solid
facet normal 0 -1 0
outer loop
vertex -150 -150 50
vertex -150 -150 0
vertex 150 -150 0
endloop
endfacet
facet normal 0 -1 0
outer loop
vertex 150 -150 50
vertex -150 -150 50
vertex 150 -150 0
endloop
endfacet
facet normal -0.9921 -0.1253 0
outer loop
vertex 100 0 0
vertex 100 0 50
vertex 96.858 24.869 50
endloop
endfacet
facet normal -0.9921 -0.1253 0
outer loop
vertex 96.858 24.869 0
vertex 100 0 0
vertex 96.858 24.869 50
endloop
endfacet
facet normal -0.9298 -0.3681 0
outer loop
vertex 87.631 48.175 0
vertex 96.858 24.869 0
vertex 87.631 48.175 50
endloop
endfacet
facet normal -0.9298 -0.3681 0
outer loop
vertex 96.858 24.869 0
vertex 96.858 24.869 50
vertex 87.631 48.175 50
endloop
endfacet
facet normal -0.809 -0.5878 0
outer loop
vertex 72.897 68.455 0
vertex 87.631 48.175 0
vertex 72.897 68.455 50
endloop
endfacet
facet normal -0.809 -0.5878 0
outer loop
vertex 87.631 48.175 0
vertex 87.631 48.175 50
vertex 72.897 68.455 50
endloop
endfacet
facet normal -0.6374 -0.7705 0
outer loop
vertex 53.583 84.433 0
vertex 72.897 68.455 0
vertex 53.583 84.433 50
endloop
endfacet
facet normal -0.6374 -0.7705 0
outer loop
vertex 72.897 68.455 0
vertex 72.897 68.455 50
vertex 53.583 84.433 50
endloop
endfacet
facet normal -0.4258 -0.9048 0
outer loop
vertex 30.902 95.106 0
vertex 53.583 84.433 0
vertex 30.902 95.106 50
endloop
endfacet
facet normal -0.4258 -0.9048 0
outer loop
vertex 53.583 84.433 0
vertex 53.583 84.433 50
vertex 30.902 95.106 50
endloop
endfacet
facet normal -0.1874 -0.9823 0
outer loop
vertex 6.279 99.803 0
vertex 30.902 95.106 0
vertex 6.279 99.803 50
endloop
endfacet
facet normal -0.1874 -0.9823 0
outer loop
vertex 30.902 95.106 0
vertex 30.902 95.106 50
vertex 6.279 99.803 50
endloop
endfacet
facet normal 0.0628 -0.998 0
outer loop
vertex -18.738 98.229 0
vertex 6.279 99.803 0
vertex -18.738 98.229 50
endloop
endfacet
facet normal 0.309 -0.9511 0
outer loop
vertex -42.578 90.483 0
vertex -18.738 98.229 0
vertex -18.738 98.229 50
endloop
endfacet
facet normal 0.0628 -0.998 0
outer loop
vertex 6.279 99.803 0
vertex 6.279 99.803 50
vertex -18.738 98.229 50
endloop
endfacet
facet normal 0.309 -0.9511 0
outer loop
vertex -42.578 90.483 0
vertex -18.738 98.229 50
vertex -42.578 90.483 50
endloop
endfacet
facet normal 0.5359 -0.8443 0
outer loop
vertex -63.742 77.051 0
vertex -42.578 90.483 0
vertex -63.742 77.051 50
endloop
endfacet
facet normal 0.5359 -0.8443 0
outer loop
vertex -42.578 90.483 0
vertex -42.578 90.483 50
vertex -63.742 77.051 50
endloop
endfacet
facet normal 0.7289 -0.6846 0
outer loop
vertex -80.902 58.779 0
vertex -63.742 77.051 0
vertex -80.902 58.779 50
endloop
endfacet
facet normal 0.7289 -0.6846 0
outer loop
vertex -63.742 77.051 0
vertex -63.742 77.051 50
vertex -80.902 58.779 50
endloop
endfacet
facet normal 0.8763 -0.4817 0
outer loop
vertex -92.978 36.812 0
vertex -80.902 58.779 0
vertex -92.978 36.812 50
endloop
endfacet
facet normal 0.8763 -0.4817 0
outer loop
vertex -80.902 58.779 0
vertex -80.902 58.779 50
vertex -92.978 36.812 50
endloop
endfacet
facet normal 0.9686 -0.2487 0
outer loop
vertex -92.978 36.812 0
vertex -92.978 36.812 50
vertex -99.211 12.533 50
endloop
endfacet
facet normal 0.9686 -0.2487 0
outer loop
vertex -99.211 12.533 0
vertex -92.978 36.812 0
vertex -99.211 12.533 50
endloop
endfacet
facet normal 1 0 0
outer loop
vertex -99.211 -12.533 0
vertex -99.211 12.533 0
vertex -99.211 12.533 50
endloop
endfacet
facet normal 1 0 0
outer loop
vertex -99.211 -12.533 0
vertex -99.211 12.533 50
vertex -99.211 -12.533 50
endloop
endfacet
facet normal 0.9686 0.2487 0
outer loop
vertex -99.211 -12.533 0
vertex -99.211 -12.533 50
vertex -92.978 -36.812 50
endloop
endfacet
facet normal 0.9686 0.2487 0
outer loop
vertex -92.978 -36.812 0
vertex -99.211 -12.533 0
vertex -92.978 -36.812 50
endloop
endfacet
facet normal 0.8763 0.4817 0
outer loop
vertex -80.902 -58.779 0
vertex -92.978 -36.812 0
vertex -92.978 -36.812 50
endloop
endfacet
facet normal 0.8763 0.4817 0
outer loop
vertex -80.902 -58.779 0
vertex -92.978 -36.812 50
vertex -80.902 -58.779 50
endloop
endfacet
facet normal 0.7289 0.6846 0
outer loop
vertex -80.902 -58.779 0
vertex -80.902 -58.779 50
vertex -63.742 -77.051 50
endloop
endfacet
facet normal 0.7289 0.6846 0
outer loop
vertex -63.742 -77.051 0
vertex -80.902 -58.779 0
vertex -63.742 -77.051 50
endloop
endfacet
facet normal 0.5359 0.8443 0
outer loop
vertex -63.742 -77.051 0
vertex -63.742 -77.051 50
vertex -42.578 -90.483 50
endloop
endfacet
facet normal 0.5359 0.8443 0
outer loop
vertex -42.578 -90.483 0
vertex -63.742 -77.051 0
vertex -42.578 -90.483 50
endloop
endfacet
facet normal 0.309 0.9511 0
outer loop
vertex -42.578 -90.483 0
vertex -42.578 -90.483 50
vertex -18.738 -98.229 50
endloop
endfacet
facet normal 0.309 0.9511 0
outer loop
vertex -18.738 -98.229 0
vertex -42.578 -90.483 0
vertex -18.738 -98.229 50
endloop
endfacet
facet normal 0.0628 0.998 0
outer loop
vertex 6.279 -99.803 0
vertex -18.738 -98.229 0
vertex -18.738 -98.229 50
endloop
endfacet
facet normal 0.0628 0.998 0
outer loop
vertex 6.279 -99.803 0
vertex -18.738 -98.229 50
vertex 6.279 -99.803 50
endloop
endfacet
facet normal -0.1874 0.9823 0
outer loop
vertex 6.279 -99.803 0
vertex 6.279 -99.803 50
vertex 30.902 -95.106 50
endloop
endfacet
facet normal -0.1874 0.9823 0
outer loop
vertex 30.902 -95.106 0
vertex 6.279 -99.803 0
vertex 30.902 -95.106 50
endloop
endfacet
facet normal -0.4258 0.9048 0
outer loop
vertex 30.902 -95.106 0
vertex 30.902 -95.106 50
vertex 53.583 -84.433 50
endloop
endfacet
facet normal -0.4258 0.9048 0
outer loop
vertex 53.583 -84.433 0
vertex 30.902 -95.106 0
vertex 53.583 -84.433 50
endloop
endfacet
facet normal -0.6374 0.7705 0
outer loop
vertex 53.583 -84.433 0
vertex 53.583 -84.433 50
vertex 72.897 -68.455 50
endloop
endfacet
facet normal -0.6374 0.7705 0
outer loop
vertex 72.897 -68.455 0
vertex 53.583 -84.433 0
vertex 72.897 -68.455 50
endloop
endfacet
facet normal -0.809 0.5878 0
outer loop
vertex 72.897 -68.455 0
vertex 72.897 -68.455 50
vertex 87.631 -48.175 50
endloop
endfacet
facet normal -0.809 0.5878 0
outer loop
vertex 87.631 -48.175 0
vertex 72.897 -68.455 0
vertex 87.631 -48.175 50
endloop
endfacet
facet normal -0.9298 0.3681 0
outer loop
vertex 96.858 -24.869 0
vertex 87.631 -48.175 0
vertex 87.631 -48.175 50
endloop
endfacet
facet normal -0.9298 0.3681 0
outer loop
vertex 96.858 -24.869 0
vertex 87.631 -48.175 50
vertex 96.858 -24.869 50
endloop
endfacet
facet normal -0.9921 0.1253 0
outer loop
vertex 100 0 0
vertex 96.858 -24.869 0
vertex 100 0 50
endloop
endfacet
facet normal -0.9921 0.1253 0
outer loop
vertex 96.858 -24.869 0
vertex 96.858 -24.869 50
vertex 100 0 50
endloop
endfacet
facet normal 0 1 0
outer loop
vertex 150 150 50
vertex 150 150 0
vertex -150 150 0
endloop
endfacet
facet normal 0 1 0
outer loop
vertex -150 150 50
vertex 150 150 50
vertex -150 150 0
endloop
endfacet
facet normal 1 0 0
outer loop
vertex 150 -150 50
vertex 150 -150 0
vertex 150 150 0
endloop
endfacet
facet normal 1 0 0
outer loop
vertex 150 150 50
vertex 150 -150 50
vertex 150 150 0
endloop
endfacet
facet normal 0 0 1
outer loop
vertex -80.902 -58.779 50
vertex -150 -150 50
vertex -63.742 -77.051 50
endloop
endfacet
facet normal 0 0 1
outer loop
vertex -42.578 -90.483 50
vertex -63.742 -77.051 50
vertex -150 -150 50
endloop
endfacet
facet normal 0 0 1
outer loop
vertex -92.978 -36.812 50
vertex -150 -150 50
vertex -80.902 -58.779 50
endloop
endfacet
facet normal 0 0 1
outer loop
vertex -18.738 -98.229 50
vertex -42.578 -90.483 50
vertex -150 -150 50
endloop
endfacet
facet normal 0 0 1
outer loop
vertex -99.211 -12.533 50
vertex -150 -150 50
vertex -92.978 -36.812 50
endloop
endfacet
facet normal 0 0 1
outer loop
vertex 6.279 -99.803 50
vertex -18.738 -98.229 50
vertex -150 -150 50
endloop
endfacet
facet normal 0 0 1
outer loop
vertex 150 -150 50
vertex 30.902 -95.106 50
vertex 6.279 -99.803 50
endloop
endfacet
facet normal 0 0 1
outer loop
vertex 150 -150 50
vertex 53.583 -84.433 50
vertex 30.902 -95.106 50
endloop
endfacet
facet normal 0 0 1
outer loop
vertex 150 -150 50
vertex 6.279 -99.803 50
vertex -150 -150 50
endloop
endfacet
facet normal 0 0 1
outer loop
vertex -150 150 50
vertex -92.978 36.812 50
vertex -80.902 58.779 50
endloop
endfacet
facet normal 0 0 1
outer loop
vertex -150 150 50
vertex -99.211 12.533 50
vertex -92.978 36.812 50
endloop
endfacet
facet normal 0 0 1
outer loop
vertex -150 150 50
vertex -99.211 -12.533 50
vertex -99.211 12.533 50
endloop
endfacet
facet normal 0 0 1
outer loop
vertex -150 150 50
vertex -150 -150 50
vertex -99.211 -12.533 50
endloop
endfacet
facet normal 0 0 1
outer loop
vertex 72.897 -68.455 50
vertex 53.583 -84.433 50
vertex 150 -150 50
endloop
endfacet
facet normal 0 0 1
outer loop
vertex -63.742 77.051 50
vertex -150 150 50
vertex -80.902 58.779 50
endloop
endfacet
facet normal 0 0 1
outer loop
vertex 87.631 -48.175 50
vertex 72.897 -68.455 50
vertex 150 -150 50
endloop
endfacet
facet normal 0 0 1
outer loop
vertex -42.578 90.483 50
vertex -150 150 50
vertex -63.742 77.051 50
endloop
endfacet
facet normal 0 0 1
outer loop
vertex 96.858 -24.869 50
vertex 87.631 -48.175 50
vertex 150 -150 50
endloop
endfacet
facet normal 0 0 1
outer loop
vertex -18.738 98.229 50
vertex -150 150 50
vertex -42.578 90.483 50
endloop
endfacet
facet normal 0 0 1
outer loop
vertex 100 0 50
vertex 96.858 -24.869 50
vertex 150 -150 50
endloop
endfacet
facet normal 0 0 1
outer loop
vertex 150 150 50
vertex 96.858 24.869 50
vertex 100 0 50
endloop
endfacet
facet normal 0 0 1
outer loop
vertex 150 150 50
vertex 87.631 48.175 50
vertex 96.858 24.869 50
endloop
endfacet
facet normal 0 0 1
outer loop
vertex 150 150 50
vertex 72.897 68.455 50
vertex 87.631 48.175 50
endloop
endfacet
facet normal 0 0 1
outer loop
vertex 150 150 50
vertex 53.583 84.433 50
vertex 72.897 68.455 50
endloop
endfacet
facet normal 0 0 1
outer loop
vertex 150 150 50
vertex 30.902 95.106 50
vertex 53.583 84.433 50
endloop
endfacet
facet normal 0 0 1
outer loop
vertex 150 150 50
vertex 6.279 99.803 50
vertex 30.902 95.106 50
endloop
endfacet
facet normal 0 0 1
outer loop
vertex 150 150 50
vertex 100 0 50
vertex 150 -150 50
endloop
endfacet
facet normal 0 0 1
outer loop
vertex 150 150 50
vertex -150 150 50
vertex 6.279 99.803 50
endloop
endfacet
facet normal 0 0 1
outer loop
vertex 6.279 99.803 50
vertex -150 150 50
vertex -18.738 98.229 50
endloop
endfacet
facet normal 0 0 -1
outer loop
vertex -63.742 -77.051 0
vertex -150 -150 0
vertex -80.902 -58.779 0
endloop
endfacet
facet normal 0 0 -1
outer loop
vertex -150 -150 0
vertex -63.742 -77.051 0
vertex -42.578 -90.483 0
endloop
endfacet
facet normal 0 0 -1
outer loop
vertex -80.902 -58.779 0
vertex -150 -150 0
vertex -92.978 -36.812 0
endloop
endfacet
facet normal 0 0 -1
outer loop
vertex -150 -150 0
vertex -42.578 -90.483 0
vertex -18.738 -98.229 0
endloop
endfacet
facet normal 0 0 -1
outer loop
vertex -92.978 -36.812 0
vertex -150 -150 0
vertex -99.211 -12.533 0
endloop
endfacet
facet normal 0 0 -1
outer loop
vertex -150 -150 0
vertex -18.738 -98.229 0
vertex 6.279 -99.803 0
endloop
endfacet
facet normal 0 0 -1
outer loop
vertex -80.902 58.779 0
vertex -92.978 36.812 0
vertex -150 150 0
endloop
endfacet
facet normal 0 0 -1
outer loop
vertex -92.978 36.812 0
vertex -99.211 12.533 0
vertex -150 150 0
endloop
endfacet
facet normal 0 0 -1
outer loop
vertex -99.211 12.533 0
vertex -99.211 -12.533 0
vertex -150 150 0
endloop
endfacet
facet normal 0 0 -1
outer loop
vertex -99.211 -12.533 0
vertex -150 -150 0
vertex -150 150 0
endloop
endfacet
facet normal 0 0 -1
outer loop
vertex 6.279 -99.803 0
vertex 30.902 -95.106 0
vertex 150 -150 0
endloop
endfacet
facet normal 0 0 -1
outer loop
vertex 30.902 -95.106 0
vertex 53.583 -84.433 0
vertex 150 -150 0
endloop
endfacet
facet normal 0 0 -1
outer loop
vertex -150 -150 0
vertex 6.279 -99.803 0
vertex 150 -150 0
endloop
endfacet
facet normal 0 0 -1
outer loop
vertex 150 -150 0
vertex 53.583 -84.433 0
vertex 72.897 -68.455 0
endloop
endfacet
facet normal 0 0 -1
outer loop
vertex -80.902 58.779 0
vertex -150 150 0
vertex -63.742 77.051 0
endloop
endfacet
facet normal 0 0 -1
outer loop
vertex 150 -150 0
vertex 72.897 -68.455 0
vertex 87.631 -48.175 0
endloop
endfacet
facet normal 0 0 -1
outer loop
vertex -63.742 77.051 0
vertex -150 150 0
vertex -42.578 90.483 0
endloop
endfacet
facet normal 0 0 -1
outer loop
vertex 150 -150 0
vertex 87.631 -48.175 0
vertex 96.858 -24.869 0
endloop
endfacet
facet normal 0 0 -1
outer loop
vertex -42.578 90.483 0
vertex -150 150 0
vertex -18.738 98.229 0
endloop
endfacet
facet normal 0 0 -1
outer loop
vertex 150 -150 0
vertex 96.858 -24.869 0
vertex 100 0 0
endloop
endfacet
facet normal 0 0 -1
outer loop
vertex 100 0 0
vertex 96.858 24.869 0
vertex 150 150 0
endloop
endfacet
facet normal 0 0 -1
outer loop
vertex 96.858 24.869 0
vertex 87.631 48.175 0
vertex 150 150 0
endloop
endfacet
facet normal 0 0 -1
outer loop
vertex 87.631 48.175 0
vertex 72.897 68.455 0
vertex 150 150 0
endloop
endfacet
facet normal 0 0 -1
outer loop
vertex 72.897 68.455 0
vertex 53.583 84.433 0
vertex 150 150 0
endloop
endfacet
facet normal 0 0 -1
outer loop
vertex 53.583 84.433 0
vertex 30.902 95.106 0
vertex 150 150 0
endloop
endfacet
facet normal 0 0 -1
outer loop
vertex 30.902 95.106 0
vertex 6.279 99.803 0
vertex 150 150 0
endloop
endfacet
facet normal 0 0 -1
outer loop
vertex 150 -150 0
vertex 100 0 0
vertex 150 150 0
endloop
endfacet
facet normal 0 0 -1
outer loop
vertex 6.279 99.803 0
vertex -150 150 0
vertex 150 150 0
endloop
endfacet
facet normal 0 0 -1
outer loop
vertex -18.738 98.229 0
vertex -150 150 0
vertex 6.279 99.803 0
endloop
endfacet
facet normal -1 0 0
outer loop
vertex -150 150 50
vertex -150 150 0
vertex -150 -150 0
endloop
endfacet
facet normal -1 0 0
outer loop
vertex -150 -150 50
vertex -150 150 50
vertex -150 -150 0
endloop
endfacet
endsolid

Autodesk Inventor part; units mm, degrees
ref_plane "YZ Plane" through (0, 0, 0) normal (1, 0, 0) x (0, 1, 0)
ref_plane "XY Plane" through (0, 0, 0) normal (0, 0, 1) x (1, 0, 0)
sketch "Sketch1" plane through (0, 0, 0) normal (0, 0, 1) x (1, 0, 0)
  line L0 (-150, -150) -> (150, -150)
  line L1 (150, -150) -> (150, 150)
  line L2 (150, 150) -> (-150, 150)
  line L3 (-150, 150) -> (-150, -150)
  line L4 (-150, -150) -> (150, 150) construction
  line L5 (150, -150) -> (-150, 150) construction
  point P0 (0, 0)
  dimension "d0" = 300
  dimension "d1" = 300
extrude "Extrusion1" add sketch "Sketch1" along normal blind 50
sketch "Sketch2" plane through (0, 0, 50) normal (0, 0, 1) x (1, 0, 0)
  circle A0 centre (0, 0) radius 100
  dimension "D_agujero" = 200
extrude "Extrusion2" cut sketch "Sketch2" against normal through all
ref_plane "Work Plane1" through (0, 100, 50) normal (0, 1, 0) x (-1, 0, 0)
equation "\"d0\" = 1.5 * tamanio_basico"
equation "\"d1\" = 1.5 * tamanio_basico"
equation "\"espesor\" = 0.25 * tamanio_basico"
equation "\"D_agujero\" = tamanio_basico"
equation "\"tamanio_basico\" = 200"
properties part number "AGUJERO"
